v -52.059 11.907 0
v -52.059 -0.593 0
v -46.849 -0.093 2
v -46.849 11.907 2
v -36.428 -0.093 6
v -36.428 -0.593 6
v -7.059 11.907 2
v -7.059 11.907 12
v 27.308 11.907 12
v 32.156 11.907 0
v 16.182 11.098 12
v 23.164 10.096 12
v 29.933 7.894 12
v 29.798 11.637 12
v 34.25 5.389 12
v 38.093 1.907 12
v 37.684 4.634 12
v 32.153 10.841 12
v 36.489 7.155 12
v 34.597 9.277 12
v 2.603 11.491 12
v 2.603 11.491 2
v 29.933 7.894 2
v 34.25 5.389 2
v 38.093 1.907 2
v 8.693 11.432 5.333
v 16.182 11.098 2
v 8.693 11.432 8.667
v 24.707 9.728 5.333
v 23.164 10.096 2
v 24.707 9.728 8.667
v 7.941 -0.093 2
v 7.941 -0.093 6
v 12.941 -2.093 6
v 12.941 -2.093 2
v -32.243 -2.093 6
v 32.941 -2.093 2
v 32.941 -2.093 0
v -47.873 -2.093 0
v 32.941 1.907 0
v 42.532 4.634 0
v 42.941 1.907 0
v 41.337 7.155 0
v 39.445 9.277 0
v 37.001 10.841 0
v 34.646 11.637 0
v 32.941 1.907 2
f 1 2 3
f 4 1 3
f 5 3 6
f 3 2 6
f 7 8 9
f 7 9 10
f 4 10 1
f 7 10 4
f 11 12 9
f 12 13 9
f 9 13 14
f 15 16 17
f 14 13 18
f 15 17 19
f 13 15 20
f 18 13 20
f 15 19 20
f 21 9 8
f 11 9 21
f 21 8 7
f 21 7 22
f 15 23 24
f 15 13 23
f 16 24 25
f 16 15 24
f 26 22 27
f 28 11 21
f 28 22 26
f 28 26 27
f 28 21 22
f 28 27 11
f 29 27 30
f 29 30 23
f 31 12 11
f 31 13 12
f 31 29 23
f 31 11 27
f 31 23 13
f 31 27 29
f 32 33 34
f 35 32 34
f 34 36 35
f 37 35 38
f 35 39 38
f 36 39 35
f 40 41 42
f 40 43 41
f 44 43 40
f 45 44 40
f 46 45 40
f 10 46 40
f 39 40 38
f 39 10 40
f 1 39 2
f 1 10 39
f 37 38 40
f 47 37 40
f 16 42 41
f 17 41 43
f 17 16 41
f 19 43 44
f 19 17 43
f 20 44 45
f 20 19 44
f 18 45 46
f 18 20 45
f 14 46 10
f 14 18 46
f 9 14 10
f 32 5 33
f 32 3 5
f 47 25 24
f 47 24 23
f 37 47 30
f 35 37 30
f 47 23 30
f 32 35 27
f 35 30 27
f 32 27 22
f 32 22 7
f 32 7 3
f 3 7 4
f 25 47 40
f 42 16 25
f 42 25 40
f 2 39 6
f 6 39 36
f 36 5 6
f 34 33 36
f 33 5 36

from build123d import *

# Parameters (mm, degrees)
SKETCH1_W           = 85
SKETCH1_H           = 14
BOSS_EXTRUDE1_DEPTH = 2
SKETCH2_W           = 85
SKETCH2_H           = 2
BOSS_EXTRUDE2_DEPTH = 6
CUT_EXTRUDE1_DEPTH  = 4
SKETCH4_W           = 10
SKETCH4_H           = 10
BOSS_EXTRUDE3_DEPTH = 2
CUT_EXTRUDE2_DEPTH  = 20
CHAMFER1_SIZE       = 1.5
SKETCH6_W           = 10
SKETCH6_H           = 10
BOSS_EXTRUDE4_DEPTH = 50
CUT_EXTRUDE3_DEPTH  = 50
FILLET1_R           = 10
CUT_EXTRUDE4_DEPTH  = 10


with BuildPart() as part:
    # Sketch1 → Boss-Extrude1 (new body)
    with BuildSketch(Plane.XY):
        with Locations((-9.558823529, 4.906862745)):
            Rectangle(SKETCH1_W, SKETCH1_H)
    extrude(amount=BOSS_EXTRUDE1_DEPTH)

    # Sketch2 → Boss-Extrude2 (add)
    with BuildSketch(Plane.XY):
        with Locations((-9.558823529, -1.093137255)):
            Rectangle(SKETCH2_W, SKETCH2_H)
    extrude(amount=BOSS_EXTRUDE2_DEPTH)

    # Sketch3 → Cut-Extrude1 (cut)
    with BuildSketch(Plane.XY.offset(6)):
        Polygon((32.941176471, -0.093137255), (7.941176471, -0.093137255), (12.941176471, -2.093137255), (32.941176471, -2.093137255), align=None)
    extrude(amount=-CUT_EXTRUDE1_DEPTH, mode=Mode.SUBTRACT)

    # Sketch4 → Boss-Extrude3 (add)
    with BuildSketch(Plane(origin=(0, 0, 0), x_dir=(-1, 0, 0), z_dir=(0, 0, -1))):
        with Locations((-37.941176471, 6.906862745)):
            Rectangle(SKETCH4_W, SKETCH4_H)
    extrude(amount=-BOSS_EXTRUDE3_DEPTH)

    # Sketch5 → Cut-Extrude2 (cut)
    with BuildSketch(Plane.XZ.offset(2.093137255)):
        Polygon((-52.058823529, 0), (-36.428289141, 6), (-52.058823529, 6), align=None)
    extrude(amount=-CUT_EXTRUDE2_DEPTH, mode=Mode.SUBTRACT)

    # Chamfer1
    chamfer1_edges = [part.edges().sort_by_distance(p)[0] for p in [
        (-44.243556335, -2.093137255, 3),
    ]]
    chamfer(chamfer1_edges, length=CHAMFER1_SIZE)

    # Sketch6 → Boss-Extrude4 (add)
    with BuildSketch(Plane(origin=(42.941176471, 0, 0), x_dir=(0, 0, -1), z_dir=(1, 0, 0))):
        with Locations((-7, 6.906862745)):
            Rectangle(SKETCH6_W, SKETCH6_H)
    extrude(amount=-BOSS_EXTRUDE4_DEPTH)

    # Sketch7 → Cut-Extrude3 (cut)
    with BuildSketch(Plane.XZ.offset(-1.906862745)):
        Polygon((42.941176471, 0), (38.092861761, 12), (42.941176471, 12), align=None)
    extrude(amount=-CUT_EXTRUDE3_DEPTH, mode=Mode.SUBTRACT)

    # Fillet1
    fillet1_edges = [part.edges().sort_by_distance(p)[0] for p in [
        (40.517019116, 11.906862745, 6),
    ]]
    fillet(fillet1_edges, radius=FILLET1_R - 0.0001)  # a hair under: the kernel refuses the full size

    # Sketch8 → Cut-Extrude4 (cut)
    with BuildSketch(Plane.XY.offset(12)):
        with BuildLine():
            Line((-7.058823529, 11.906862745), (-7.058823529, 1.906862745))
            Line((-7.058823529, 1.906862745), (38.092861761, 1.906862745))
            add(Edge.make_bspline(
                [(-7.058823529, 11.906862745), (7.597424673, 10.416193164), (26.985171478, 14.416758063), (38.092861761, 1.906862745)],
                knots=[0, 0, 0, 0, 1, 1, 1, 1], degree=3))
        make_face()
    extrude(amount=-CUT_EXTRUDE4_DEPTH, mode=Mode.SUBTRACT)


solid = part.part
